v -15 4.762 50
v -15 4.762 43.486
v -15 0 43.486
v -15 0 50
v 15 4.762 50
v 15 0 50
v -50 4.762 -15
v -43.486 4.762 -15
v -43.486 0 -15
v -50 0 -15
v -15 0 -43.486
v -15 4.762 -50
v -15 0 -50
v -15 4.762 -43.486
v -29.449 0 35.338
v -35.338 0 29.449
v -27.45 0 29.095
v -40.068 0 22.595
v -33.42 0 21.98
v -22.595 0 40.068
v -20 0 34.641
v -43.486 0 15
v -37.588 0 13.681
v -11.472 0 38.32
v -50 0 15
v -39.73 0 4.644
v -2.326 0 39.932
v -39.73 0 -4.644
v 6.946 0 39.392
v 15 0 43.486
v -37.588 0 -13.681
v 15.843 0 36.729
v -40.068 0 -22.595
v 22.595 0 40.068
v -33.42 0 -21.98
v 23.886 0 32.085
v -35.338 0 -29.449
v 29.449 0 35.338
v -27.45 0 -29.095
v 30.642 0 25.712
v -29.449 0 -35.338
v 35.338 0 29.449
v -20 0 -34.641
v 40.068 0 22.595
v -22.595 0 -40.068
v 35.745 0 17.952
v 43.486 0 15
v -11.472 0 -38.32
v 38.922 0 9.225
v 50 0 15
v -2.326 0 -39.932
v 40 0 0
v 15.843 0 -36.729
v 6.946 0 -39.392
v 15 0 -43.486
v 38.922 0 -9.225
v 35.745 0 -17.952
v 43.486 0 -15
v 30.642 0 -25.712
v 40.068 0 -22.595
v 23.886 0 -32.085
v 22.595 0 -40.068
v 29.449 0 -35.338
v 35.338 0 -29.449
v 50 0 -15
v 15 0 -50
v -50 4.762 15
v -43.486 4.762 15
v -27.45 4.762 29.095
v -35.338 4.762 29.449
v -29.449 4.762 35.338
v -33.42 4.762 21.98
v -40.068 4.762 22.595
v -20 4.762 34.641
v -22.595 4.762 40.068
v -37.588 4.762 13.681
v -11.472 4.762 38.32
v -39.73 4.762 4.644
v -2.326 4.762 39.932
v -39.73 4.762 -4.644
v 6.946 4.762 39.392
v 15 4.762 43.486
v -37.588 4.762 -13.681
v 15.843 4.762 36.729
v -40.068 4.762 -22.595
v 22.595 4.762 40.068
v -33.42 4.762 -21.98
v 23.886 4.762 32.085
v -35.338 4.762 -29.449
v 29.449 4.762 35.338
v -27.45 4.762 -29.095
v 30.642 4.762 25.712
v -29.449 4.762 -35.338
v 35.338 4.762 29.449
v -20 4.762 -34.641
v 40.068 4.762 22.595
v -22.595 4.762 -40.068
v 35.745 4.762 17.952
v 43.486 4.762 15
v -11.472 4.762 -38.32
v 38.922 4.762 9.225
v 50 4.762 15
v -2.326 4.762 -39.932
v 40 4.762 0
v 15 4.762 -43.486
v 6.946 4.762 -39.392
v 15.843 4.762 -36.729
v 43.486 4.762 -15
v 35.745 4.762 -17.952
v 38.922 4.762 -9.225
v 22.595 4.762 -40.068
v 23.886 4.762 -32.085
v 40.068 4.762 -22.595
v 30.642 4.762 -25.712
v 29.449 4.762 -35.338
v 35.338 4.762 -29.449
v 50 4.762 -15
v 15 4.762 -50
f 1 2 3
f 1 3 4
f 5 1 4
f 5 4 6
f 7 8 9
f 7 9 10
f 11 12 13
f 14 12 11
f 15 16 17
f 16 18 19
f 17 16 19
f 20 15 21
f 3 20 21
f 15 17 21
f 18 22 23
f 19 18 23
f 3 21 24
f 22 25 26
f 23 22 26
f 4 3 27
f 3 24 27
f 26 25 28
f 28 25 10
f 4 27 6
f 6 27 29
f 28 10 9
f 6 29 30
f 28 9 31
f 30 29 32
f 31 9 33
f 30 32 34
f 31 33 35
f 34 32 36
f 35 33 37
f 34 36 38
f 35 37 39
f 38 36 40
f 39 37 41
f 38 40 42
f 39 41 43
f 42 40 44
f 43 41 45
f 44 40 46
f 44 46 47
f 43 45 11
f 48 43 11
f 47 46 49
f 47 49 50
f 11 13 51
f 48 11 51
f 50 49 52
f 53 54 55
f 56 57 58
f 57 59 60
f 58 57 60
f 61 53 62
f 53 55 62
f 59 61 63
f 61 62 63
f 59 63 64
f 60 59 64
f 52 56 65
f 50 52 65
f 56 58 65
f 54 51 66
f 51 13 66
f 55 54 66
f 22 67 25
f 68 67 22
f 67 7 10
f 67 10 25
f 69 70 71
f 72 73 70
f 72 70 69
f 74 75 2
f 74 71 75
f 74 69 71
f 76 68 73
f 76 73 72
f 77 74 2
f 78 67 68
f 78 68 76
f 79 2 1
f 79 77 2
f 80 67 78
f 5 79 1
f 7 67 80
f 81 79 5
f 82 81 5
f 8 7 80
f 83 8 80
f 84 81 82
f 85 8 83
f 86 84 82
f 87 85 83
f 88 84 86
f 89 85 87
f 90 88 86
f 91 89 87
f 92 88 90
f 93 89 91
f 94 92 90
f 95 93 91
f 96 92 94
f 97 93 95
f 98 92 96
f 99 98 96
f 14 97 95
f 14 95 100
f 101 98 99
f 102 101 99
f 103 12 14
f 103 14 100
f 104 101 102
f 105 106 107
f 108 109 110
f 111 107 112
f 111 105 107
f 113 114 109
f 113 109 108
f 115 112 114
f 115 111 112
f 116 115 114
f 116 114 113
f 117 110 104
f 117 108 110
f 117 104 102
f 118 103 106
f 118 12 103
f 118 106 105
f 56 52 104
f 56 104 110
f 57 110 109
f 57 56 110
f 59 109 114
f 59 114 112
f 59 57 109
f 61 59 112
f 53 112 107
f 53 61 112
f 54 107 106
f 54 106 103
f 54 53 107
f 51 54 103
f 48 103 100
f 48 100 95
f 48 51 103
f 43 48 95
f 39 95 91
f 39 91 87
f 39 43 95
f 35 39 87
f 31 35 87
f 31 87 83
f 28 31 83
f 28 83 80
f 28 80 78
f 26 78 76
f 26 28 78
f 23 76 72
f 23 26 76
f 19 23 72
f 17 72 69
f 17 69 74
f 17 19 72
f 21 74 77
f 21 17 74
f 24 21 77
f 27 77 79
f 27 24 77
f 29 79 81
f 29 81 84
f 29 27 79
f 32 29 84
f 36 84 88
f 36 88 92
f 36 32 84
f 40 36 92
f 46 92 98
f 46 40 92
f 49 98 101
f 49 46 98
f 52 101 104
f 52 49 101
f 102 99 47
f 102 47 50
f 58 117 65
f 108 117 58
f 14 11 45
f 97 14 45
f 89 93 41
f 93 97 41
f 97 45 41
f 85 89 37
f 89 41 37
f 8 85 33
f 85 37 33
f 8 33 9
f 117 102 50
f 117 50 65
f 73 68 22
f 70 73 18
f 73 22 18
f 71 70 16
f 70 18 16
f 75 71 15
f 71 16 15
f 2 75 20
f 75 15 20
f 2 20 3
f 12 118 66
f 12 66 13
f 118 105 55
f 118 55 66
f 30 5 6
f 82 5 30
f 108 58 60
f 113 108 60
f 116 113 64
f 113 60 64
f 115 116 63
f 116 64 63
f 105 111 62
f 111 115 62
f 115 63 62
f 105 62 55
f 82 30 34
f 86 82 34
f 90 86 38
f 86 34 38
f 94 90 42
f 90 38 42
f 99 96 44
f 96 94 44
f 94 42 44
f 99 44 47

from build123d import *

# Parameters (mm, degrees)
SKETCH1_R           = 46
SKETCH1_R_2         = 40
BOSS_EXTRUDE1_DEPTH = 4.7625
BOSS_EXTRUDE2_DEPTH = 4.7625
CIRPATTERN1_COUNT   = 4


with BuildPart() as part:
    # Sketch1 → Boss-Extrude1 (new body)
    with BuildSketch(Plane(origin=(0, 0, 0), x_dir=(1, 0, 0), z_dir=(0, 1, 0))):
        Circle(SKETCH1_R)
        Circle(SKETCH1_R_2, mode=Mode.SUBTRACT)
    extrude(amount=BOSS_EXTRUDE1_DEPTH)

    # Sketch2 → Boss-Extrude2 (add)
    with BuildSketch(Plane(origin=(0, 4.7625, 0), x_dir=(1, 0, 0), z_dir=(0, 1, 0))):
        with BuildLine():
            Line((-43.48562981, 15), (-50, 15))
            Line((-50, 15), (-50, -15))
            Line((-50, -15), (-43.48562981, -15))
            ThreePointArc((-43.48562981, -15), (-46, 0), (-43.48562981, 15))
        make_face()
    boss_extrude2 = extrude(amount=-BOSS_EXTRUDE2_DEPTH)

    # CirPattern1: Boss-Extrude2 ×4 about axis
    cirpattern1_axis = Axis((0, 0, 0), (0, 1, 0))
    for i in range(1, CIRPATTERN1_COUNT):
        add(boss_extrude2.rotate(cirpattern1_axis, i * 360 / CIRPATTERN1_COUNT))


solid = part.part
